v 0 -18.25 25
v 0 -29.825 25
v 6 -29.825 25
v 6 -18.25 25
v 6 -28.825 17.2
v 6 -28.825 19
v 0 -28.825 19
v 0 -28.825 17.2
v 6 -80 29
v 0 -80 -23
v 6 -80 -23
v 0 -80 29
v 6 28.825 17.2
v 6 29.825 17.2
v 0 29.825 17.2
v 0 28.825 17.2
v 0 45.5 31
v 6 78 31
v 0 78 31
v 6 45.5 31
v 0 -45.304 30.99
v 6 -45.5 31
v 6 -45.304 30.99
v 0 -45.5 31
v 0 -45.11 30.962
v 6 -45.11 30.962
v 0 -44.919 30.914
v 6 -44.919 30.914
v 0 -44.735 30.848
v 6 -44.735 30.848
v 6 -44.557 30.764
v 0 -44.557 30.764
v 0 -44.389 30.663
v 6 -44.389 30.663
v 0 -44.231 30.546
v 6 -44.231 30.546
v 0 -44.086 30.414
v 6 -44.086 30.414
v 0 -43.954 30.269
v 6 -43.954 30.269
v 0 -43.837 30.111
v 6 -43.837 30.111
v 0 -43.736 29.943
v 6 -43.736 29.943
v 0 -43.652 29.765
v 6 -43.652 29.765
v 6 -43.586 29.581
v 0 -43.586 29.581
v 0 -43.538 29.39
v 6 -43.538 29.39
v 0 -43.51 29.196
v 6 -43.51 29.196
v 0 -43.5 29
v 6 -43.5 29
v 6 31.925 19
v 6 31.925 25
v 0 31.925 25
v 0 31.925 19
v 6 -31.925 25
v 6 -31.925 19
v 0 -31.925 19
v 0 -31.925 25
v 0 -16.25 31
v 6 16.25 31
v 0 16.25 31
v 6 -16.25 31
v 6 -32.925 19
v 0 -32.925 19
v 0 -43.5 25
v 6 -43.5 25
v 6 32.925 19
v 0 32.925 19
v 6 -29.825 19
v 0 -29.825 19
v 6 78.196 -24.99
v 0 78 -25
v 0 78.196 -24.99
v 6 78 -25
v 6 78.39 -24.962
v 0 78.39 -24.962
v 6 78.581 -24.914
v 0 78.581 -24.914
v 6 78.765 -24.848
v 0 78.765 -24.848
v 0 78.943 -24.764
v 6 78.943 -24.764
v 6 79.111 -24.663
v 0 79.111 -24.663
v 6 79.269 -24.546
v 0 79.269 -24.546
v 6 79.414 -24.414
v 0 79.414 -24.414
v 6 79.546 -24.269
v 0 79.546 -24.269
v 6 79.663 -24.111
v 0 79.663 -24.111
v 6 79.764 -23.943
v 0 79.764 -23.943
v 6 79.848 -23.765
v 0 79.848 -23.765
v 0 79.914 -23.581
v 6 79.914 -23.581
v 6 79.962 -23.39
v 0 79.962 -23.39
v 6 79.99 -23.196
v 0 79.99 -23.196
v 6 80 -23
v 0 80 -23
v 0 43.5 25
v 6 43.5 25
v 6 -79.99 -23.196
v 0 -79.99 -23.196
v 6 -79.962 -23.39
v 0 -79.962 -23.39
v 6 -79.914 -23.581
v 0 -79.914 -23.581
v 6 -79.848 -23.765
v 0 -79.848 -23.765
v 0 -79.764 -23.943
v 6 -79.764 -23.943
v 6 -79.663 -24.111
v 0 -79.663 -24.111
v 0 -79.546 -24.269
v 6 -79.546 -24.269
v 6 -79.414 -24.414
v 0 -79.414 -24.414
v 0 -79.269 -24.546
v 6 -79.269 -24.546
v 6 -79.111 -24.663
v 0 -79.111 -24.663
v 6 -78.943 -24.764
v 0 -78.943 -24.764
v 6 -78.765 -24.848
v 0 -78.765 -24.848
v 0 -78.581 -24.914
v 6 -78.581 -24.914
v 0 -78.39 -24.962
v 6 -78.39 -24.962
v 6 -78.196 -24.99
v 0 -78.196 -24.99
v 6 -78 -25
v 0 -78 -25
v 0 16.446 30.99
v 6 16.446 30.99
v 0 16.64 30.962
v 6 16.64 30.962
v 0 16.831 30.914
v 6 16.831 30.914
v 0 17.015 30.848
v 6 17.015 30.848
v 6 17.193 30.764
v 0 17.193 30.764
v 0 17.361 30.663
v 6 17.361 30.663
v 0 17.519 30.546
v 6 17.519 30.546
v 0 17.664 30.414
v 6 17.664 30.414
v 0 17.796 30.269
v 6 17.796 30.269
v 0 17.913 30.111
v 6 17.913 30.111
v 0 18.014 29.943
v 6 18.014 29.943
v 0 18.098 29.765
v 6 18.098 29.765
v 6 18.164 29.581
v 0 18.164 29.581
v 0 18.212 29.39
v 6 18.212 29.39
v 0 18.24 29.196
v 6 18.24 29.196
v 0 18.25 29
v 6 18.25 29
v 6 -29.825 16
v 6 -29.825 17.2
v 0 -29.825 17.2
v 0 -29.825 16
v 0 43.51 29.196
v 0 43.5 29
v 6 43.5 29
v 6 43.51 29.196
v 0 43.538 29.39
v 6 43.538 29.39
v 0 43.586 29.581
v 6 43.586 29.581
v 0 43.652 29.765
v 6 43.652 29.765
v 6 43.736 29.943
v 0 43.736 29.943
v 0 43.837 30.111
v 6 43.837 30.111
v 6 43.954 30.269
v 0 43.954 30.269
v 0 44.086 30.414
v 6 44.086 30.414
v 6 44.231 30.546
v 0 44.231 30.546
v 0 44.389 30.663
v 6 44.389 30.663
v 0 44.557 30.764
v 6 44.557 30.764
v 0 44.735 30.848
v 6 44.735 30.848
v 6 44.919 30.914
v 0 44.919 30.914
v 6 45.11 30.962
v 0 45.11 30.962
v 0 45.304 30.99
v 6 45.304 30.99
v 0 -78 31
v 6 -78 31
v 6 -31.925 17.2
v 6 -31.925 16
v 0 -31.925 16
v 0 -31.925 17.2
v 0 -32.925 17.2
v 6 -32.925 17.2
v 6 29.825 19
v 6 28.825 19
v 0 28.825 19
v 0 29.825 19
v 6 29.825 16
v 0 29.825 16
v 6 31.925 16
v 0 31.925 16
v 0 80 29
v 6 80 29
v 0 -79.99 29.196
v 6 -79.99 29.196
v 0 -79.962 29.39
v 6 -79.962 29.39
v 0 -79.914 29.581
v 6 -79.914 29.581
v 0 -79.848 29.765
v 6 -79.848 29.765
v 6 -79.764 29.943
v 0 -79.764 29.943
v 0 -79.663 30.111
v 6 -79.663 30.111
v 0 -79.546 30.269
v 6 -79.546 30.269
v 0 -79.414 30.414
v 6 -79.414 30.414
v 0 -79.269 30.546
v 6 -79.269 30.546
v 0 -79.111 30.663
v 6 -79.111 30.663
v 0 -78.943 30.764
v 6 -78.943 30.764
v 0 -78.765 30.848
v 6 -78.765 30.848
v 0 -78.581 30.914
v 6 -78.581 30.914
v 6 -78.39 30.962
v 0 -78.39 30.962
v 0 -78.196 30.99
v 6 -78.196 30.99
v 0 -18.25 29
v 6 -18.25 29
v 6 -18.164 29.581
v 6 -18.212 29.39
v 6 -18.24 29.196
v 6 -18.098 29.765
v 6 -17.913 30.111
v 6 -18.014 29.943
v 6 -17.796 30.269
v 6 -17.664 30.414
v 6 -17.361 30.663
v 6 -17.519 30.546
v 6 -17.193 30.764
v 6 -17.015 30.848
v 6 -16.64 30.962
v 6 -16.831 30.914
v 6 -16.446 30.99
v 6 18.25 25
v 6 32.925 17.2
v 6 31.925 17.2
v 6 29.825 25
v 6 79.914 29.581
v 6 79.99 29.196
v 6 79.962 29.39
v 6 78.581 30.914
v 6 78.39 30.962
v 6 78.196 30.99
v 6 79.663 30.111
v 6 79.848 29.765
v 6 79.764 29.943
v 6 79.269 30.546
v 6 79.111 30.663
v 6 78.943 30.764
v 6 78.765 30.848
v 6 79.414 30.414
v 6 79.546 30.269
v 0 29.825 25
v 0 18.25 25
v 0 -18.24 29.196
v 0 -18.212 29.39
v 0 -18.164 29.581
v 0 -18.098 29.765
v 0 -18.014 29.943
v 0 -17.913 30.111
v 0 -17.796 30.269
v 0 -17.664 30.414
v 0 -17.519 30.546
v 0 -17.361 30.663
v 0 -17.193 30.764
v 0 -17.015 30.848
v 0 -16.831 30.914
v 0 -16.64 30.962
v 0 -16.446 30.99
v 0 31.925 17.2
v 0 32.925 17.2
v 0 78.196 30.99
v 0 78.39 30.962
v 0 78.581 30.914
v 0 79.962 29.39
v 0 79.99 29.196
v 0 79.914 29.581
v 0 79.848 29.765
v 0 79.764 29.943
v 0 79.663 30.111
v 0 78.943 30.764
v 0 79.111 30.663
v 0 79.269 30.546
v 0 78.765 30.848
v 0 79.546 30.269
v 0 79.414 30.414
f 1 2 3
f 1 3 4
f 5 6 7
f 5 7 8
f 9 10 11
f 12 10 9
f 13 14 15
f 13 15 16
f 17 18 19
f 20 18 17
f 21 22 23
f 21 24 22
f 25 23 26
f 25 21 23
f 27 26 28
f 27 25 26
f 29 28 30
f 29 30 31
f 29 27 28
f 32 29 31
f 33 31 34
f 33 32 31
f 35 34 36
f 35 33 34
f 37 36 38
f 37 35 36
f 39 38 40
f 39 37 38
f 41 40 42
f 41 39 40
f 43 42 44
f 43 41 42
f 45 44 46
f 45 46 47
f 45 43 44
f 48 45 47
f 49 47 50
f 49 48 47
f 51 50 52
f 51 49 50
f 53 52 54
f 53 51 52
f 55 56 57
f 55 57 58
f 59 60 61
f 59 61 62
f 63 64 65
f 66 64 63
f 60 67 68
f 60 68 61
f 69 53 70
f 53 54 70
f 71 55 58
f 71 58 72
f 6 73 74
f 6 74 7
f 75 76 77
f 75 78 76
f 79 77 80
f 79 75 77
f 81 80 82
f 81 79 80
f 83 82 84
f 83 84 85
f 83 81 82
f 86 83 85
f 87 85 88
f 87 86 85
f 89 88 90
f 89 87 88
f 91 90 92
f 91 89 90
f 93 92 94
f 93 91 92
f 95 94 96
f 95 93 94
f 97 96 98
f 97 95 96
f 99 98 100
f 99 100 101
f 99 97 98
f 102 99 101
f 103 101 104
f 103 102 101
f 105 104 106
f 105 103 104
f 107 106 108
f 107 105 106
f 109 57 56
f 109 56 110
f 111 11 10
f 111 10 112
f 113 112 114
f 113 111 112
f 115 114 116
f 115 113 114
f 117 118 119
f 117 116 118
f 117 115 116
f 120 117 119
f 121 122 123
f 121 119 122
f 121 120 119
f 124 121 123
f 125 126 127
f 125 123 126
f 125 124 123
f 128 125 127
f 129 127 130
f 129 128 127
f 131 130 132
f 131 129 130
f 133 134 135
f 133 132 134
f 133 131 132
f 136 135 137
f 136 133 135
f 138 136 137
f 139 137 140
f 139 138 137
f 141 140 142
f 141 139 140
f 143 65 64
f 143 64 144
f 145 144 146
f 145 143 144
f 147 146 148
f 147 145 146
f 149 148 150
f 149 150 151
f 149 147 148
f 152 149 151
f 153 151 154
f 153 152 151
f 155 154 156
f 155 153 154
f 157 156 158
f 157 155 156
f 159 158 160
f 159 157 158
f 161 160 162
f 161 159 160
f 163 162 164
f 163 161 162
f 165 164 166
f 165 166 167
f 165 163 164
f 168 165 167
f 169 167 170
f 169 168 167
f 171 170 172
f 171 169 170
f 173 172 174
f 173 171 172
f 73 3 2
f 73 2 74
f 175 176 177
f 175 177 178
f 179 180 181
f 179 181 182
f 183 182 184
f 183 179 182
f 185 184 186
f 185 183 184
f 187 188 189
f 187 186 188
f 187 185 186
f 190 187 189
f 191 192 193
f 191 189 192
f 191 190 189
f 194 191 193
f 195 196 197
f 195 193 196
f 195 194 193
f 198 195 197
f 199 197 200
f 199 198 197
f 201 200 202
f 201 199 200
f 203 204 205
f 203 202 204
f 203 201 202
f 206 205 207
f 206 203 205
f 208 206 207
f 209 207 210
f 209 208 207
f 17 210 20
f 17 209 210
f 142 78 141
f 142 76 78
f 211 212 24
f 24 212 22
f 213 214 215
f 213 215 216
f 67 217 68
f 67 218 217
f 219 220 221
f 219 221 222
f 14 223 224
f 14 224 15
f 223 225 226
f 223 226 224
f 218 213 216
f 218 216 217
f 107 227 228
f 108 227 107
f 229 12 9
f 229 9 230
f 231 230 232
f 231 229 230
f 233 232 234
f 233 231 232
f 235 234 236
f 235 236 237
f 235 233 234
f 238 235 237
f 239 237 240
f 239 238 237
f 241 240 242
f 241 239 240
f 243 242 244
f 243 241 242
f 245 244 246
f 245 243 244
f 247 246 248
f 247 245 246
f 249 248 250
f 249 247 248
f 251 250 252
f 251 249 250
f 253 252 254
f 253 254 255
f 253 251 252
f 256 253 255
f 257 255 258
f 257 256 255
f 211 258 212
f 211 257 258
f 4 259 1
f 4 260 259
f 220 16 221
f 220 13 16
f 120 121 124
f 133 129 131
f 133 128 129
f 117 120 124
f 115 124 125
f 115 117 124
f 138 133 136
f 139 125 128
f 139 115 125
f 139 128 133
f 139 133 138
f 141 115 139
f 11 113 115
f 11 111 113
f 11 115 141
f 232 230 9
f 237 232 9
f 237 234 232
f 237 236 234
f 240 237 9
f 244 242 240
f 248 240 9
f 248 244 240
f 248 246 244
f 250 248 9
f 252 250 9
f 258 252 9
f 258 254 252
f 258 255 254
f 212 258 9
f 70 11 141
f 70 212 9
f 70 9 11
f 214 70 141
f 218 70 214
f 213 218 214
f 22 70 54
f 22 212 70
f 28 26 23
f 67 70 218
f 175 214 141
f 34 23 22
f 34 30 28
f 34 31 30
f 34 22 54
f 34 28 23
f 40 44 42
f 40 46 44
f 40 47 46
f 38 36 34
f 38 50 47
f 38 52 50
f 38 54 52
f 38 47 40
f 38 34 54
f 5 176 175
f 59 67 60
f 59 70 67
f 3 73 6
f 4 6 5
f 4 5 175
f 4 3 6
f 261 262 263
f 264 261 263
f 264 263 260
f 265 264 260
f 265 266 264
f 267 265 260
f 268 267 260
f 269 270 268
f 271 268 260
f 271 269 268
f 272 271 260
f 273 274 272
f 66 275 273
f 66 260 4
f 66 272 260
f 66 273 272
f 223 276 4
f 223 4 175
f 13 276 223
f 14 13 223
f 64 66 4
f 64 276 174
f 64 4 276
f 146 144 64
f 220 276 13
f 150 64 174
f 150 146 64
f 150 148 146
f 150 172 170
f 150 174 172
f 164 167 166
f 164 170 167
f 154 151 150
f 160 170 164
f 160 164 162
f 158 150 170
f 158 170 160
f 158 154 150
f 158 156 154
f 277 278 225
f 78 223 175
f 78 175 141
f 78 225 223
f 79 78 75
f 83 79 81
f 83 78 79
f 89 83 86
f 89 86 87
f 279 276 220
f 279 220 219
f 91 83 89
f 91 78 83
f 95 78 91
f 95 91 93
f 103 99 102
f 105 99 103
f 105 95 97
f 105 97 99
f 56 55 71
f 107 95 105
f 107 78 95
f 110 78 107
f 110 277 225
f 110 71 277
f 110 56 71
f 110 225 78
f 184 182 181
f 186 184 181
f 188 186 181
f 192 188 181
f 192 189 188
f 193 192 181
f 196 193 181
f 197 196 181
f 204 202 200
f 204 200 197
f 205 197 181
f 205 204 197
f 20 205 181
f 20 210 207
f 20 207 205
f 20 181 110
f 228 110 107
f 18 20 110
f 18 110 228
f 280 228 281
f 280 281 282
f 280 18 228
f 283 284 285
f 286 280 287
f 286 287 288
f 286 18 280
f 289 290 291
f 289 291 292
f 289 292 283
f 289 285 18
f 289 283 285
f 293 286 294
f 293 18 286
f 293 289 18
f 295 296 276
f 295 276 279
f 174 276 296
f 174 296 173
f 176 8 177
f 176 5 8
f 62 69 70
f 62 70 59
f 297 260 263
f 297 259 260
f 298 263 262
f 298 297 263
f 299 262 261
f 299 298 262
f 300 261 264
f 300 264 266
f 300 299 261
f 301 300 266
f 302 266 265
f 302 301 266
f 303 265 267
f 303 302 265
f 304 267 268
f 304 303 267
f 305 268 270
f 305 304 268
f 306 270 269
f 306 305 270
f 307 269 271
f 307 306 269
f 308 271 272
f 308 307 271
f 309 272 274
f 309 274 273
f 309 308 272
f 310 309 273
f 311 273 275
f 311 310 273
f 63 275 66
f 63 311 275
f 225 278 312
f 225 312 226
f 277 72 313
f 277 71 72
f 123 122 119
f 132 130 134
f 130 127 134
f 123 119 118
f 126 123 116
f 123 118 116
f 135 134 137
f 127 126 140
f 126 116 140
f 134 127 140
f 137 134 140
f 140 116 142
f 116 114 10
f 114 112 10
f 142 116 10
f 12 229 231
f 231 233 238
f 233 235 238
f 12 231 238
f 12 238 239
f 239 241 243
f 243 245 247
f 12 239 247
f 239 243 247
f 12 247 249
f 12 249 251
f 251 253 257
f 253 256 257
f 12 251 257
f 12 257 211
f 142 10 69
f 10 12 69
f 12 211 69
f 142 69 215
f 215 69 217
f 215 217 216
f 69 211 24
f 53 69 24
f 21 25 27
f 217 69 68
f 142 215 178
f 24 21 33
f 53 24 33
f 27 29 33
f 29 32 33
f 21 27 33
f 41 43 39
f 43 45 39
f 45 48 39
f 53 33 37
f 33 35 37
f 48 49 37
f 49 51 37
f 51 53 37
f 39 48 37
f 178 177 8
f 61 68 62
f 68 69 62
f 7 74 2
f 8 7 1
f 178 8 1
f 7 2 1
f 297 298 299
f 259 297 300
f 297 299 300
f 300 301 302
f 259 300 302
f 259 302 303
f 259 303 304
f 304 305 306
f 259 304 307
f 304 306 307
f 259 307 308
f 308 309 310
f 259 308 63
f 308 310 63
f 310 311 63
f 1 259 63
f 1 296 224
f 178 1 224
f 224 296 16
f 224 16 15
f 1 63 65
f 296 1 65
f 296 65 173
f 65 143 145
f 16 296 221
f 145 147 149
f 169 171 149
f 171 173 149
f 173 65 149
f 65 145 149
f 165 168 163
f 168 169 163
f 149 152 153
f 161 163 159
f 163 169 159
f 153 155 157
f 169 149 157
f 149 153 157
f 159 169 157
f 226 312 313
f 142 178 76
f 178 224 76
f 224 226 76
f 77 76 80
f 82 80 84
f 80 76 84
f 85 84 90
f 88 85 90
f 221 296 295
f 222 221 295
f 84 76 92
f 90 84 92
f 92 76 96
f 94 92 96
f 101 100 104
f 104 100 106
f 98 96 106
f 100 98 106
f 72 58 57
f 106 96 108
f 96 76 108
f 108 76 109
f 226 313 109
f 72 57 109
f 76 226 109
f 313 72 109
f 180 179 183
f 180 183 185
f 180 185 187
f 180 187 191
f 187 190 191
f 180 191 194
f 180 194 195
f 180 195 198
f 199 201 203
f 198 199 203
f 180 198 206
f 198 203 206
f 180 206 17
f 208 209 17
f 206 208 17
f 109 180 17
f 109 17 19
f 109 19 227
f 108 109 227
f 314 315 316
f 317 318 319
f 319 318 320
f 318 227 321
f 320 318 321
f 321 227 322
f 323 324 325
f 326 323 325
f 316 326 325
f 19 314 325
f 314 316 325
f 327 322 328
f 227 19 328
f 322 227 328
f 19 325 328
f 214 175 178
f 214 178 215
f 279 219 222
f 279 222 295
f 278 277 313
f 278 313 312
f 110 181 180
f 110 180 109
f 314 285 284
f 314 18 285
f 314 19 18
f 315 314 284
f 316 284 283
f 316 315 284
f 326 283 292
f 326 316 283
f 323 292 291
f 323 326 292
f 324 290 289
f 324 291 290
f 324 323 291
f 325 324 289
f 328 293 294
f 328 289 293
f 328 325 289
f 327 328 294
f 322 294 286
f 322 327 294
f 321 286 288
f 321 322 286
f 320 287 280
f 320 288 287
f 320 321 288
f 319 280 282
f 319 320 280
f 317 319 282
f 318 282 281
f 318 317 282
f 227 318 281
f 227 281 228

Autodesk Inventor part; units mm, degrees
ref_plane "YZ Plane" through (0, 0, 0) normal (1, 0, 0) x (0, 1, 0)
ref_plane "XZ Plane" through (0, 0, 0) normal (0, 1, 0) x (-1, 0, 0)
ref_plane "XY Plane" through (0, 0, 0) normal (0, 0, 1) x (1, 0, 0)
sketch "Sketch1" plane through (0, 0, 0) normal (1, 0, 0) x (0, 1, 0)
  line L0 (80, -25) -> (-80, -25)
  line L1 (-80, -25) -> (-80, 25)
  line L2 (-80, 25) -> (80, 25)
  line L3 (80, 25) -> (80, -25)
  line L4 (80, -25) -> (-80, 25) construction
  line L5 (-80, -25) -> (80, 25) construction
  point P0 (0, 0)
  dimension "d0" = 160
  dimension "d1" = 50
extrude "Extrusion1" add sketch "Sketch1" along normal blind 6
sketch "Sketch2" plane through (6, 0, 0) normal (1, 0, 0) x (0, 0, -1)
  line L0 (-25, 80) -> (-25, -80) projected
  line L1 (-25, 80) -> (-31, 80)
  line L2 (-31, 80) -> (-31, 43.5)
  line L3 (-31, 43.5) -> (-25, 43.5)
  line L4 (-25, 43.5) -> (-25, 80)
  line L5 (-25, 18.25) -> (-31, 18.25)
  line L6 (-31, 18.25) -> (-31, -18.25)
  line L7 (-31, -18.25) -> (-25, -18.25)
  line L8 (-25, -18.25) -> (-25, 18.25)
  line L9 (-25, -80) -> (-31, -80)
  line L10 (-31, -80) -> (-31, -43.5)
  line L11 (-31, -43.5) -> (-25, -43.5)
  line L12 (-25, -43.5) -> (-25, -80)
  point P0 (0, 0)
  dimension "d4" = 6
  dimension "d5" = 25.25
  dimension "d6" = 25.25
extrude "Extrusion2" add sketch "Sketch2" against normal blind 6
sketch "Sketch3" plane through (6, 0, 0) normal (1, 0, 0) x (0, 0, -1)
  line L0 (-25, 43.5) -> (-25, 18.25) projected
  line L1 (-31, -80) -> (25, -80) projected
  line L2 (-25, 30.875) -> (0, 30.875) construction
  line L3 (-25, 29.825) -> (-25, 31.925)
  line L4 (-25, 31.925) -> (-19, 31.925)
  line L5 (-19, 31.925) -> (-19, 32.925)
  line L6 (-19, 32.925) -> (-17.2, 32.925)
  line L7 (-17.2, 32.925) -> (-17.2, 31.925)
  line L8 (-17.2, 31.925) -> (-16, 31.925)
  line L9 (-16, 31.925) -> (-16, 29.825)
  line L10 (-16, 29.825) -> (-17.2, 29.825)
  line L11 (-17.2, 29.825) -> (-17.2, 28.825)
  line L12 (-17.2, 28.825) -> (-19, 28.825)
  line L13 (-19, 28.825) -> (-19, 29.825)
  line L14 (-19, 29.825) -> (-25, 29.825)
  point P0 (0, 0)
  dimension "d9" = 1.8
  dimension "d10" = 4.1
  dimension "d11" = 2.1
  dimension "d12" = 1.05
  dimension "d13" = 9
  dimension "d14" = 2.05
  dimension "d15" = 6
extrude "Extrusion3" cut sketch "Sketch3" against normal through all
mirror "Mirror1" about plane through (0, 0, 0) normal (0, 1, 0) of "Extrusion3"
fillet "Fillet1" radius 2 8 edges at (3, 43.5, 31) (3, 80, 31) (3, 18.25, 31) (3, -18.25, 31) (3, -43.5, 31) (3, -80, 31) (3, 80, -25) (3, -80, -25)
equation "\"d12\" = 0.5 * d11"
equation "\"d14\" = 0.5 * d10"
properties part number "InnerSide"
